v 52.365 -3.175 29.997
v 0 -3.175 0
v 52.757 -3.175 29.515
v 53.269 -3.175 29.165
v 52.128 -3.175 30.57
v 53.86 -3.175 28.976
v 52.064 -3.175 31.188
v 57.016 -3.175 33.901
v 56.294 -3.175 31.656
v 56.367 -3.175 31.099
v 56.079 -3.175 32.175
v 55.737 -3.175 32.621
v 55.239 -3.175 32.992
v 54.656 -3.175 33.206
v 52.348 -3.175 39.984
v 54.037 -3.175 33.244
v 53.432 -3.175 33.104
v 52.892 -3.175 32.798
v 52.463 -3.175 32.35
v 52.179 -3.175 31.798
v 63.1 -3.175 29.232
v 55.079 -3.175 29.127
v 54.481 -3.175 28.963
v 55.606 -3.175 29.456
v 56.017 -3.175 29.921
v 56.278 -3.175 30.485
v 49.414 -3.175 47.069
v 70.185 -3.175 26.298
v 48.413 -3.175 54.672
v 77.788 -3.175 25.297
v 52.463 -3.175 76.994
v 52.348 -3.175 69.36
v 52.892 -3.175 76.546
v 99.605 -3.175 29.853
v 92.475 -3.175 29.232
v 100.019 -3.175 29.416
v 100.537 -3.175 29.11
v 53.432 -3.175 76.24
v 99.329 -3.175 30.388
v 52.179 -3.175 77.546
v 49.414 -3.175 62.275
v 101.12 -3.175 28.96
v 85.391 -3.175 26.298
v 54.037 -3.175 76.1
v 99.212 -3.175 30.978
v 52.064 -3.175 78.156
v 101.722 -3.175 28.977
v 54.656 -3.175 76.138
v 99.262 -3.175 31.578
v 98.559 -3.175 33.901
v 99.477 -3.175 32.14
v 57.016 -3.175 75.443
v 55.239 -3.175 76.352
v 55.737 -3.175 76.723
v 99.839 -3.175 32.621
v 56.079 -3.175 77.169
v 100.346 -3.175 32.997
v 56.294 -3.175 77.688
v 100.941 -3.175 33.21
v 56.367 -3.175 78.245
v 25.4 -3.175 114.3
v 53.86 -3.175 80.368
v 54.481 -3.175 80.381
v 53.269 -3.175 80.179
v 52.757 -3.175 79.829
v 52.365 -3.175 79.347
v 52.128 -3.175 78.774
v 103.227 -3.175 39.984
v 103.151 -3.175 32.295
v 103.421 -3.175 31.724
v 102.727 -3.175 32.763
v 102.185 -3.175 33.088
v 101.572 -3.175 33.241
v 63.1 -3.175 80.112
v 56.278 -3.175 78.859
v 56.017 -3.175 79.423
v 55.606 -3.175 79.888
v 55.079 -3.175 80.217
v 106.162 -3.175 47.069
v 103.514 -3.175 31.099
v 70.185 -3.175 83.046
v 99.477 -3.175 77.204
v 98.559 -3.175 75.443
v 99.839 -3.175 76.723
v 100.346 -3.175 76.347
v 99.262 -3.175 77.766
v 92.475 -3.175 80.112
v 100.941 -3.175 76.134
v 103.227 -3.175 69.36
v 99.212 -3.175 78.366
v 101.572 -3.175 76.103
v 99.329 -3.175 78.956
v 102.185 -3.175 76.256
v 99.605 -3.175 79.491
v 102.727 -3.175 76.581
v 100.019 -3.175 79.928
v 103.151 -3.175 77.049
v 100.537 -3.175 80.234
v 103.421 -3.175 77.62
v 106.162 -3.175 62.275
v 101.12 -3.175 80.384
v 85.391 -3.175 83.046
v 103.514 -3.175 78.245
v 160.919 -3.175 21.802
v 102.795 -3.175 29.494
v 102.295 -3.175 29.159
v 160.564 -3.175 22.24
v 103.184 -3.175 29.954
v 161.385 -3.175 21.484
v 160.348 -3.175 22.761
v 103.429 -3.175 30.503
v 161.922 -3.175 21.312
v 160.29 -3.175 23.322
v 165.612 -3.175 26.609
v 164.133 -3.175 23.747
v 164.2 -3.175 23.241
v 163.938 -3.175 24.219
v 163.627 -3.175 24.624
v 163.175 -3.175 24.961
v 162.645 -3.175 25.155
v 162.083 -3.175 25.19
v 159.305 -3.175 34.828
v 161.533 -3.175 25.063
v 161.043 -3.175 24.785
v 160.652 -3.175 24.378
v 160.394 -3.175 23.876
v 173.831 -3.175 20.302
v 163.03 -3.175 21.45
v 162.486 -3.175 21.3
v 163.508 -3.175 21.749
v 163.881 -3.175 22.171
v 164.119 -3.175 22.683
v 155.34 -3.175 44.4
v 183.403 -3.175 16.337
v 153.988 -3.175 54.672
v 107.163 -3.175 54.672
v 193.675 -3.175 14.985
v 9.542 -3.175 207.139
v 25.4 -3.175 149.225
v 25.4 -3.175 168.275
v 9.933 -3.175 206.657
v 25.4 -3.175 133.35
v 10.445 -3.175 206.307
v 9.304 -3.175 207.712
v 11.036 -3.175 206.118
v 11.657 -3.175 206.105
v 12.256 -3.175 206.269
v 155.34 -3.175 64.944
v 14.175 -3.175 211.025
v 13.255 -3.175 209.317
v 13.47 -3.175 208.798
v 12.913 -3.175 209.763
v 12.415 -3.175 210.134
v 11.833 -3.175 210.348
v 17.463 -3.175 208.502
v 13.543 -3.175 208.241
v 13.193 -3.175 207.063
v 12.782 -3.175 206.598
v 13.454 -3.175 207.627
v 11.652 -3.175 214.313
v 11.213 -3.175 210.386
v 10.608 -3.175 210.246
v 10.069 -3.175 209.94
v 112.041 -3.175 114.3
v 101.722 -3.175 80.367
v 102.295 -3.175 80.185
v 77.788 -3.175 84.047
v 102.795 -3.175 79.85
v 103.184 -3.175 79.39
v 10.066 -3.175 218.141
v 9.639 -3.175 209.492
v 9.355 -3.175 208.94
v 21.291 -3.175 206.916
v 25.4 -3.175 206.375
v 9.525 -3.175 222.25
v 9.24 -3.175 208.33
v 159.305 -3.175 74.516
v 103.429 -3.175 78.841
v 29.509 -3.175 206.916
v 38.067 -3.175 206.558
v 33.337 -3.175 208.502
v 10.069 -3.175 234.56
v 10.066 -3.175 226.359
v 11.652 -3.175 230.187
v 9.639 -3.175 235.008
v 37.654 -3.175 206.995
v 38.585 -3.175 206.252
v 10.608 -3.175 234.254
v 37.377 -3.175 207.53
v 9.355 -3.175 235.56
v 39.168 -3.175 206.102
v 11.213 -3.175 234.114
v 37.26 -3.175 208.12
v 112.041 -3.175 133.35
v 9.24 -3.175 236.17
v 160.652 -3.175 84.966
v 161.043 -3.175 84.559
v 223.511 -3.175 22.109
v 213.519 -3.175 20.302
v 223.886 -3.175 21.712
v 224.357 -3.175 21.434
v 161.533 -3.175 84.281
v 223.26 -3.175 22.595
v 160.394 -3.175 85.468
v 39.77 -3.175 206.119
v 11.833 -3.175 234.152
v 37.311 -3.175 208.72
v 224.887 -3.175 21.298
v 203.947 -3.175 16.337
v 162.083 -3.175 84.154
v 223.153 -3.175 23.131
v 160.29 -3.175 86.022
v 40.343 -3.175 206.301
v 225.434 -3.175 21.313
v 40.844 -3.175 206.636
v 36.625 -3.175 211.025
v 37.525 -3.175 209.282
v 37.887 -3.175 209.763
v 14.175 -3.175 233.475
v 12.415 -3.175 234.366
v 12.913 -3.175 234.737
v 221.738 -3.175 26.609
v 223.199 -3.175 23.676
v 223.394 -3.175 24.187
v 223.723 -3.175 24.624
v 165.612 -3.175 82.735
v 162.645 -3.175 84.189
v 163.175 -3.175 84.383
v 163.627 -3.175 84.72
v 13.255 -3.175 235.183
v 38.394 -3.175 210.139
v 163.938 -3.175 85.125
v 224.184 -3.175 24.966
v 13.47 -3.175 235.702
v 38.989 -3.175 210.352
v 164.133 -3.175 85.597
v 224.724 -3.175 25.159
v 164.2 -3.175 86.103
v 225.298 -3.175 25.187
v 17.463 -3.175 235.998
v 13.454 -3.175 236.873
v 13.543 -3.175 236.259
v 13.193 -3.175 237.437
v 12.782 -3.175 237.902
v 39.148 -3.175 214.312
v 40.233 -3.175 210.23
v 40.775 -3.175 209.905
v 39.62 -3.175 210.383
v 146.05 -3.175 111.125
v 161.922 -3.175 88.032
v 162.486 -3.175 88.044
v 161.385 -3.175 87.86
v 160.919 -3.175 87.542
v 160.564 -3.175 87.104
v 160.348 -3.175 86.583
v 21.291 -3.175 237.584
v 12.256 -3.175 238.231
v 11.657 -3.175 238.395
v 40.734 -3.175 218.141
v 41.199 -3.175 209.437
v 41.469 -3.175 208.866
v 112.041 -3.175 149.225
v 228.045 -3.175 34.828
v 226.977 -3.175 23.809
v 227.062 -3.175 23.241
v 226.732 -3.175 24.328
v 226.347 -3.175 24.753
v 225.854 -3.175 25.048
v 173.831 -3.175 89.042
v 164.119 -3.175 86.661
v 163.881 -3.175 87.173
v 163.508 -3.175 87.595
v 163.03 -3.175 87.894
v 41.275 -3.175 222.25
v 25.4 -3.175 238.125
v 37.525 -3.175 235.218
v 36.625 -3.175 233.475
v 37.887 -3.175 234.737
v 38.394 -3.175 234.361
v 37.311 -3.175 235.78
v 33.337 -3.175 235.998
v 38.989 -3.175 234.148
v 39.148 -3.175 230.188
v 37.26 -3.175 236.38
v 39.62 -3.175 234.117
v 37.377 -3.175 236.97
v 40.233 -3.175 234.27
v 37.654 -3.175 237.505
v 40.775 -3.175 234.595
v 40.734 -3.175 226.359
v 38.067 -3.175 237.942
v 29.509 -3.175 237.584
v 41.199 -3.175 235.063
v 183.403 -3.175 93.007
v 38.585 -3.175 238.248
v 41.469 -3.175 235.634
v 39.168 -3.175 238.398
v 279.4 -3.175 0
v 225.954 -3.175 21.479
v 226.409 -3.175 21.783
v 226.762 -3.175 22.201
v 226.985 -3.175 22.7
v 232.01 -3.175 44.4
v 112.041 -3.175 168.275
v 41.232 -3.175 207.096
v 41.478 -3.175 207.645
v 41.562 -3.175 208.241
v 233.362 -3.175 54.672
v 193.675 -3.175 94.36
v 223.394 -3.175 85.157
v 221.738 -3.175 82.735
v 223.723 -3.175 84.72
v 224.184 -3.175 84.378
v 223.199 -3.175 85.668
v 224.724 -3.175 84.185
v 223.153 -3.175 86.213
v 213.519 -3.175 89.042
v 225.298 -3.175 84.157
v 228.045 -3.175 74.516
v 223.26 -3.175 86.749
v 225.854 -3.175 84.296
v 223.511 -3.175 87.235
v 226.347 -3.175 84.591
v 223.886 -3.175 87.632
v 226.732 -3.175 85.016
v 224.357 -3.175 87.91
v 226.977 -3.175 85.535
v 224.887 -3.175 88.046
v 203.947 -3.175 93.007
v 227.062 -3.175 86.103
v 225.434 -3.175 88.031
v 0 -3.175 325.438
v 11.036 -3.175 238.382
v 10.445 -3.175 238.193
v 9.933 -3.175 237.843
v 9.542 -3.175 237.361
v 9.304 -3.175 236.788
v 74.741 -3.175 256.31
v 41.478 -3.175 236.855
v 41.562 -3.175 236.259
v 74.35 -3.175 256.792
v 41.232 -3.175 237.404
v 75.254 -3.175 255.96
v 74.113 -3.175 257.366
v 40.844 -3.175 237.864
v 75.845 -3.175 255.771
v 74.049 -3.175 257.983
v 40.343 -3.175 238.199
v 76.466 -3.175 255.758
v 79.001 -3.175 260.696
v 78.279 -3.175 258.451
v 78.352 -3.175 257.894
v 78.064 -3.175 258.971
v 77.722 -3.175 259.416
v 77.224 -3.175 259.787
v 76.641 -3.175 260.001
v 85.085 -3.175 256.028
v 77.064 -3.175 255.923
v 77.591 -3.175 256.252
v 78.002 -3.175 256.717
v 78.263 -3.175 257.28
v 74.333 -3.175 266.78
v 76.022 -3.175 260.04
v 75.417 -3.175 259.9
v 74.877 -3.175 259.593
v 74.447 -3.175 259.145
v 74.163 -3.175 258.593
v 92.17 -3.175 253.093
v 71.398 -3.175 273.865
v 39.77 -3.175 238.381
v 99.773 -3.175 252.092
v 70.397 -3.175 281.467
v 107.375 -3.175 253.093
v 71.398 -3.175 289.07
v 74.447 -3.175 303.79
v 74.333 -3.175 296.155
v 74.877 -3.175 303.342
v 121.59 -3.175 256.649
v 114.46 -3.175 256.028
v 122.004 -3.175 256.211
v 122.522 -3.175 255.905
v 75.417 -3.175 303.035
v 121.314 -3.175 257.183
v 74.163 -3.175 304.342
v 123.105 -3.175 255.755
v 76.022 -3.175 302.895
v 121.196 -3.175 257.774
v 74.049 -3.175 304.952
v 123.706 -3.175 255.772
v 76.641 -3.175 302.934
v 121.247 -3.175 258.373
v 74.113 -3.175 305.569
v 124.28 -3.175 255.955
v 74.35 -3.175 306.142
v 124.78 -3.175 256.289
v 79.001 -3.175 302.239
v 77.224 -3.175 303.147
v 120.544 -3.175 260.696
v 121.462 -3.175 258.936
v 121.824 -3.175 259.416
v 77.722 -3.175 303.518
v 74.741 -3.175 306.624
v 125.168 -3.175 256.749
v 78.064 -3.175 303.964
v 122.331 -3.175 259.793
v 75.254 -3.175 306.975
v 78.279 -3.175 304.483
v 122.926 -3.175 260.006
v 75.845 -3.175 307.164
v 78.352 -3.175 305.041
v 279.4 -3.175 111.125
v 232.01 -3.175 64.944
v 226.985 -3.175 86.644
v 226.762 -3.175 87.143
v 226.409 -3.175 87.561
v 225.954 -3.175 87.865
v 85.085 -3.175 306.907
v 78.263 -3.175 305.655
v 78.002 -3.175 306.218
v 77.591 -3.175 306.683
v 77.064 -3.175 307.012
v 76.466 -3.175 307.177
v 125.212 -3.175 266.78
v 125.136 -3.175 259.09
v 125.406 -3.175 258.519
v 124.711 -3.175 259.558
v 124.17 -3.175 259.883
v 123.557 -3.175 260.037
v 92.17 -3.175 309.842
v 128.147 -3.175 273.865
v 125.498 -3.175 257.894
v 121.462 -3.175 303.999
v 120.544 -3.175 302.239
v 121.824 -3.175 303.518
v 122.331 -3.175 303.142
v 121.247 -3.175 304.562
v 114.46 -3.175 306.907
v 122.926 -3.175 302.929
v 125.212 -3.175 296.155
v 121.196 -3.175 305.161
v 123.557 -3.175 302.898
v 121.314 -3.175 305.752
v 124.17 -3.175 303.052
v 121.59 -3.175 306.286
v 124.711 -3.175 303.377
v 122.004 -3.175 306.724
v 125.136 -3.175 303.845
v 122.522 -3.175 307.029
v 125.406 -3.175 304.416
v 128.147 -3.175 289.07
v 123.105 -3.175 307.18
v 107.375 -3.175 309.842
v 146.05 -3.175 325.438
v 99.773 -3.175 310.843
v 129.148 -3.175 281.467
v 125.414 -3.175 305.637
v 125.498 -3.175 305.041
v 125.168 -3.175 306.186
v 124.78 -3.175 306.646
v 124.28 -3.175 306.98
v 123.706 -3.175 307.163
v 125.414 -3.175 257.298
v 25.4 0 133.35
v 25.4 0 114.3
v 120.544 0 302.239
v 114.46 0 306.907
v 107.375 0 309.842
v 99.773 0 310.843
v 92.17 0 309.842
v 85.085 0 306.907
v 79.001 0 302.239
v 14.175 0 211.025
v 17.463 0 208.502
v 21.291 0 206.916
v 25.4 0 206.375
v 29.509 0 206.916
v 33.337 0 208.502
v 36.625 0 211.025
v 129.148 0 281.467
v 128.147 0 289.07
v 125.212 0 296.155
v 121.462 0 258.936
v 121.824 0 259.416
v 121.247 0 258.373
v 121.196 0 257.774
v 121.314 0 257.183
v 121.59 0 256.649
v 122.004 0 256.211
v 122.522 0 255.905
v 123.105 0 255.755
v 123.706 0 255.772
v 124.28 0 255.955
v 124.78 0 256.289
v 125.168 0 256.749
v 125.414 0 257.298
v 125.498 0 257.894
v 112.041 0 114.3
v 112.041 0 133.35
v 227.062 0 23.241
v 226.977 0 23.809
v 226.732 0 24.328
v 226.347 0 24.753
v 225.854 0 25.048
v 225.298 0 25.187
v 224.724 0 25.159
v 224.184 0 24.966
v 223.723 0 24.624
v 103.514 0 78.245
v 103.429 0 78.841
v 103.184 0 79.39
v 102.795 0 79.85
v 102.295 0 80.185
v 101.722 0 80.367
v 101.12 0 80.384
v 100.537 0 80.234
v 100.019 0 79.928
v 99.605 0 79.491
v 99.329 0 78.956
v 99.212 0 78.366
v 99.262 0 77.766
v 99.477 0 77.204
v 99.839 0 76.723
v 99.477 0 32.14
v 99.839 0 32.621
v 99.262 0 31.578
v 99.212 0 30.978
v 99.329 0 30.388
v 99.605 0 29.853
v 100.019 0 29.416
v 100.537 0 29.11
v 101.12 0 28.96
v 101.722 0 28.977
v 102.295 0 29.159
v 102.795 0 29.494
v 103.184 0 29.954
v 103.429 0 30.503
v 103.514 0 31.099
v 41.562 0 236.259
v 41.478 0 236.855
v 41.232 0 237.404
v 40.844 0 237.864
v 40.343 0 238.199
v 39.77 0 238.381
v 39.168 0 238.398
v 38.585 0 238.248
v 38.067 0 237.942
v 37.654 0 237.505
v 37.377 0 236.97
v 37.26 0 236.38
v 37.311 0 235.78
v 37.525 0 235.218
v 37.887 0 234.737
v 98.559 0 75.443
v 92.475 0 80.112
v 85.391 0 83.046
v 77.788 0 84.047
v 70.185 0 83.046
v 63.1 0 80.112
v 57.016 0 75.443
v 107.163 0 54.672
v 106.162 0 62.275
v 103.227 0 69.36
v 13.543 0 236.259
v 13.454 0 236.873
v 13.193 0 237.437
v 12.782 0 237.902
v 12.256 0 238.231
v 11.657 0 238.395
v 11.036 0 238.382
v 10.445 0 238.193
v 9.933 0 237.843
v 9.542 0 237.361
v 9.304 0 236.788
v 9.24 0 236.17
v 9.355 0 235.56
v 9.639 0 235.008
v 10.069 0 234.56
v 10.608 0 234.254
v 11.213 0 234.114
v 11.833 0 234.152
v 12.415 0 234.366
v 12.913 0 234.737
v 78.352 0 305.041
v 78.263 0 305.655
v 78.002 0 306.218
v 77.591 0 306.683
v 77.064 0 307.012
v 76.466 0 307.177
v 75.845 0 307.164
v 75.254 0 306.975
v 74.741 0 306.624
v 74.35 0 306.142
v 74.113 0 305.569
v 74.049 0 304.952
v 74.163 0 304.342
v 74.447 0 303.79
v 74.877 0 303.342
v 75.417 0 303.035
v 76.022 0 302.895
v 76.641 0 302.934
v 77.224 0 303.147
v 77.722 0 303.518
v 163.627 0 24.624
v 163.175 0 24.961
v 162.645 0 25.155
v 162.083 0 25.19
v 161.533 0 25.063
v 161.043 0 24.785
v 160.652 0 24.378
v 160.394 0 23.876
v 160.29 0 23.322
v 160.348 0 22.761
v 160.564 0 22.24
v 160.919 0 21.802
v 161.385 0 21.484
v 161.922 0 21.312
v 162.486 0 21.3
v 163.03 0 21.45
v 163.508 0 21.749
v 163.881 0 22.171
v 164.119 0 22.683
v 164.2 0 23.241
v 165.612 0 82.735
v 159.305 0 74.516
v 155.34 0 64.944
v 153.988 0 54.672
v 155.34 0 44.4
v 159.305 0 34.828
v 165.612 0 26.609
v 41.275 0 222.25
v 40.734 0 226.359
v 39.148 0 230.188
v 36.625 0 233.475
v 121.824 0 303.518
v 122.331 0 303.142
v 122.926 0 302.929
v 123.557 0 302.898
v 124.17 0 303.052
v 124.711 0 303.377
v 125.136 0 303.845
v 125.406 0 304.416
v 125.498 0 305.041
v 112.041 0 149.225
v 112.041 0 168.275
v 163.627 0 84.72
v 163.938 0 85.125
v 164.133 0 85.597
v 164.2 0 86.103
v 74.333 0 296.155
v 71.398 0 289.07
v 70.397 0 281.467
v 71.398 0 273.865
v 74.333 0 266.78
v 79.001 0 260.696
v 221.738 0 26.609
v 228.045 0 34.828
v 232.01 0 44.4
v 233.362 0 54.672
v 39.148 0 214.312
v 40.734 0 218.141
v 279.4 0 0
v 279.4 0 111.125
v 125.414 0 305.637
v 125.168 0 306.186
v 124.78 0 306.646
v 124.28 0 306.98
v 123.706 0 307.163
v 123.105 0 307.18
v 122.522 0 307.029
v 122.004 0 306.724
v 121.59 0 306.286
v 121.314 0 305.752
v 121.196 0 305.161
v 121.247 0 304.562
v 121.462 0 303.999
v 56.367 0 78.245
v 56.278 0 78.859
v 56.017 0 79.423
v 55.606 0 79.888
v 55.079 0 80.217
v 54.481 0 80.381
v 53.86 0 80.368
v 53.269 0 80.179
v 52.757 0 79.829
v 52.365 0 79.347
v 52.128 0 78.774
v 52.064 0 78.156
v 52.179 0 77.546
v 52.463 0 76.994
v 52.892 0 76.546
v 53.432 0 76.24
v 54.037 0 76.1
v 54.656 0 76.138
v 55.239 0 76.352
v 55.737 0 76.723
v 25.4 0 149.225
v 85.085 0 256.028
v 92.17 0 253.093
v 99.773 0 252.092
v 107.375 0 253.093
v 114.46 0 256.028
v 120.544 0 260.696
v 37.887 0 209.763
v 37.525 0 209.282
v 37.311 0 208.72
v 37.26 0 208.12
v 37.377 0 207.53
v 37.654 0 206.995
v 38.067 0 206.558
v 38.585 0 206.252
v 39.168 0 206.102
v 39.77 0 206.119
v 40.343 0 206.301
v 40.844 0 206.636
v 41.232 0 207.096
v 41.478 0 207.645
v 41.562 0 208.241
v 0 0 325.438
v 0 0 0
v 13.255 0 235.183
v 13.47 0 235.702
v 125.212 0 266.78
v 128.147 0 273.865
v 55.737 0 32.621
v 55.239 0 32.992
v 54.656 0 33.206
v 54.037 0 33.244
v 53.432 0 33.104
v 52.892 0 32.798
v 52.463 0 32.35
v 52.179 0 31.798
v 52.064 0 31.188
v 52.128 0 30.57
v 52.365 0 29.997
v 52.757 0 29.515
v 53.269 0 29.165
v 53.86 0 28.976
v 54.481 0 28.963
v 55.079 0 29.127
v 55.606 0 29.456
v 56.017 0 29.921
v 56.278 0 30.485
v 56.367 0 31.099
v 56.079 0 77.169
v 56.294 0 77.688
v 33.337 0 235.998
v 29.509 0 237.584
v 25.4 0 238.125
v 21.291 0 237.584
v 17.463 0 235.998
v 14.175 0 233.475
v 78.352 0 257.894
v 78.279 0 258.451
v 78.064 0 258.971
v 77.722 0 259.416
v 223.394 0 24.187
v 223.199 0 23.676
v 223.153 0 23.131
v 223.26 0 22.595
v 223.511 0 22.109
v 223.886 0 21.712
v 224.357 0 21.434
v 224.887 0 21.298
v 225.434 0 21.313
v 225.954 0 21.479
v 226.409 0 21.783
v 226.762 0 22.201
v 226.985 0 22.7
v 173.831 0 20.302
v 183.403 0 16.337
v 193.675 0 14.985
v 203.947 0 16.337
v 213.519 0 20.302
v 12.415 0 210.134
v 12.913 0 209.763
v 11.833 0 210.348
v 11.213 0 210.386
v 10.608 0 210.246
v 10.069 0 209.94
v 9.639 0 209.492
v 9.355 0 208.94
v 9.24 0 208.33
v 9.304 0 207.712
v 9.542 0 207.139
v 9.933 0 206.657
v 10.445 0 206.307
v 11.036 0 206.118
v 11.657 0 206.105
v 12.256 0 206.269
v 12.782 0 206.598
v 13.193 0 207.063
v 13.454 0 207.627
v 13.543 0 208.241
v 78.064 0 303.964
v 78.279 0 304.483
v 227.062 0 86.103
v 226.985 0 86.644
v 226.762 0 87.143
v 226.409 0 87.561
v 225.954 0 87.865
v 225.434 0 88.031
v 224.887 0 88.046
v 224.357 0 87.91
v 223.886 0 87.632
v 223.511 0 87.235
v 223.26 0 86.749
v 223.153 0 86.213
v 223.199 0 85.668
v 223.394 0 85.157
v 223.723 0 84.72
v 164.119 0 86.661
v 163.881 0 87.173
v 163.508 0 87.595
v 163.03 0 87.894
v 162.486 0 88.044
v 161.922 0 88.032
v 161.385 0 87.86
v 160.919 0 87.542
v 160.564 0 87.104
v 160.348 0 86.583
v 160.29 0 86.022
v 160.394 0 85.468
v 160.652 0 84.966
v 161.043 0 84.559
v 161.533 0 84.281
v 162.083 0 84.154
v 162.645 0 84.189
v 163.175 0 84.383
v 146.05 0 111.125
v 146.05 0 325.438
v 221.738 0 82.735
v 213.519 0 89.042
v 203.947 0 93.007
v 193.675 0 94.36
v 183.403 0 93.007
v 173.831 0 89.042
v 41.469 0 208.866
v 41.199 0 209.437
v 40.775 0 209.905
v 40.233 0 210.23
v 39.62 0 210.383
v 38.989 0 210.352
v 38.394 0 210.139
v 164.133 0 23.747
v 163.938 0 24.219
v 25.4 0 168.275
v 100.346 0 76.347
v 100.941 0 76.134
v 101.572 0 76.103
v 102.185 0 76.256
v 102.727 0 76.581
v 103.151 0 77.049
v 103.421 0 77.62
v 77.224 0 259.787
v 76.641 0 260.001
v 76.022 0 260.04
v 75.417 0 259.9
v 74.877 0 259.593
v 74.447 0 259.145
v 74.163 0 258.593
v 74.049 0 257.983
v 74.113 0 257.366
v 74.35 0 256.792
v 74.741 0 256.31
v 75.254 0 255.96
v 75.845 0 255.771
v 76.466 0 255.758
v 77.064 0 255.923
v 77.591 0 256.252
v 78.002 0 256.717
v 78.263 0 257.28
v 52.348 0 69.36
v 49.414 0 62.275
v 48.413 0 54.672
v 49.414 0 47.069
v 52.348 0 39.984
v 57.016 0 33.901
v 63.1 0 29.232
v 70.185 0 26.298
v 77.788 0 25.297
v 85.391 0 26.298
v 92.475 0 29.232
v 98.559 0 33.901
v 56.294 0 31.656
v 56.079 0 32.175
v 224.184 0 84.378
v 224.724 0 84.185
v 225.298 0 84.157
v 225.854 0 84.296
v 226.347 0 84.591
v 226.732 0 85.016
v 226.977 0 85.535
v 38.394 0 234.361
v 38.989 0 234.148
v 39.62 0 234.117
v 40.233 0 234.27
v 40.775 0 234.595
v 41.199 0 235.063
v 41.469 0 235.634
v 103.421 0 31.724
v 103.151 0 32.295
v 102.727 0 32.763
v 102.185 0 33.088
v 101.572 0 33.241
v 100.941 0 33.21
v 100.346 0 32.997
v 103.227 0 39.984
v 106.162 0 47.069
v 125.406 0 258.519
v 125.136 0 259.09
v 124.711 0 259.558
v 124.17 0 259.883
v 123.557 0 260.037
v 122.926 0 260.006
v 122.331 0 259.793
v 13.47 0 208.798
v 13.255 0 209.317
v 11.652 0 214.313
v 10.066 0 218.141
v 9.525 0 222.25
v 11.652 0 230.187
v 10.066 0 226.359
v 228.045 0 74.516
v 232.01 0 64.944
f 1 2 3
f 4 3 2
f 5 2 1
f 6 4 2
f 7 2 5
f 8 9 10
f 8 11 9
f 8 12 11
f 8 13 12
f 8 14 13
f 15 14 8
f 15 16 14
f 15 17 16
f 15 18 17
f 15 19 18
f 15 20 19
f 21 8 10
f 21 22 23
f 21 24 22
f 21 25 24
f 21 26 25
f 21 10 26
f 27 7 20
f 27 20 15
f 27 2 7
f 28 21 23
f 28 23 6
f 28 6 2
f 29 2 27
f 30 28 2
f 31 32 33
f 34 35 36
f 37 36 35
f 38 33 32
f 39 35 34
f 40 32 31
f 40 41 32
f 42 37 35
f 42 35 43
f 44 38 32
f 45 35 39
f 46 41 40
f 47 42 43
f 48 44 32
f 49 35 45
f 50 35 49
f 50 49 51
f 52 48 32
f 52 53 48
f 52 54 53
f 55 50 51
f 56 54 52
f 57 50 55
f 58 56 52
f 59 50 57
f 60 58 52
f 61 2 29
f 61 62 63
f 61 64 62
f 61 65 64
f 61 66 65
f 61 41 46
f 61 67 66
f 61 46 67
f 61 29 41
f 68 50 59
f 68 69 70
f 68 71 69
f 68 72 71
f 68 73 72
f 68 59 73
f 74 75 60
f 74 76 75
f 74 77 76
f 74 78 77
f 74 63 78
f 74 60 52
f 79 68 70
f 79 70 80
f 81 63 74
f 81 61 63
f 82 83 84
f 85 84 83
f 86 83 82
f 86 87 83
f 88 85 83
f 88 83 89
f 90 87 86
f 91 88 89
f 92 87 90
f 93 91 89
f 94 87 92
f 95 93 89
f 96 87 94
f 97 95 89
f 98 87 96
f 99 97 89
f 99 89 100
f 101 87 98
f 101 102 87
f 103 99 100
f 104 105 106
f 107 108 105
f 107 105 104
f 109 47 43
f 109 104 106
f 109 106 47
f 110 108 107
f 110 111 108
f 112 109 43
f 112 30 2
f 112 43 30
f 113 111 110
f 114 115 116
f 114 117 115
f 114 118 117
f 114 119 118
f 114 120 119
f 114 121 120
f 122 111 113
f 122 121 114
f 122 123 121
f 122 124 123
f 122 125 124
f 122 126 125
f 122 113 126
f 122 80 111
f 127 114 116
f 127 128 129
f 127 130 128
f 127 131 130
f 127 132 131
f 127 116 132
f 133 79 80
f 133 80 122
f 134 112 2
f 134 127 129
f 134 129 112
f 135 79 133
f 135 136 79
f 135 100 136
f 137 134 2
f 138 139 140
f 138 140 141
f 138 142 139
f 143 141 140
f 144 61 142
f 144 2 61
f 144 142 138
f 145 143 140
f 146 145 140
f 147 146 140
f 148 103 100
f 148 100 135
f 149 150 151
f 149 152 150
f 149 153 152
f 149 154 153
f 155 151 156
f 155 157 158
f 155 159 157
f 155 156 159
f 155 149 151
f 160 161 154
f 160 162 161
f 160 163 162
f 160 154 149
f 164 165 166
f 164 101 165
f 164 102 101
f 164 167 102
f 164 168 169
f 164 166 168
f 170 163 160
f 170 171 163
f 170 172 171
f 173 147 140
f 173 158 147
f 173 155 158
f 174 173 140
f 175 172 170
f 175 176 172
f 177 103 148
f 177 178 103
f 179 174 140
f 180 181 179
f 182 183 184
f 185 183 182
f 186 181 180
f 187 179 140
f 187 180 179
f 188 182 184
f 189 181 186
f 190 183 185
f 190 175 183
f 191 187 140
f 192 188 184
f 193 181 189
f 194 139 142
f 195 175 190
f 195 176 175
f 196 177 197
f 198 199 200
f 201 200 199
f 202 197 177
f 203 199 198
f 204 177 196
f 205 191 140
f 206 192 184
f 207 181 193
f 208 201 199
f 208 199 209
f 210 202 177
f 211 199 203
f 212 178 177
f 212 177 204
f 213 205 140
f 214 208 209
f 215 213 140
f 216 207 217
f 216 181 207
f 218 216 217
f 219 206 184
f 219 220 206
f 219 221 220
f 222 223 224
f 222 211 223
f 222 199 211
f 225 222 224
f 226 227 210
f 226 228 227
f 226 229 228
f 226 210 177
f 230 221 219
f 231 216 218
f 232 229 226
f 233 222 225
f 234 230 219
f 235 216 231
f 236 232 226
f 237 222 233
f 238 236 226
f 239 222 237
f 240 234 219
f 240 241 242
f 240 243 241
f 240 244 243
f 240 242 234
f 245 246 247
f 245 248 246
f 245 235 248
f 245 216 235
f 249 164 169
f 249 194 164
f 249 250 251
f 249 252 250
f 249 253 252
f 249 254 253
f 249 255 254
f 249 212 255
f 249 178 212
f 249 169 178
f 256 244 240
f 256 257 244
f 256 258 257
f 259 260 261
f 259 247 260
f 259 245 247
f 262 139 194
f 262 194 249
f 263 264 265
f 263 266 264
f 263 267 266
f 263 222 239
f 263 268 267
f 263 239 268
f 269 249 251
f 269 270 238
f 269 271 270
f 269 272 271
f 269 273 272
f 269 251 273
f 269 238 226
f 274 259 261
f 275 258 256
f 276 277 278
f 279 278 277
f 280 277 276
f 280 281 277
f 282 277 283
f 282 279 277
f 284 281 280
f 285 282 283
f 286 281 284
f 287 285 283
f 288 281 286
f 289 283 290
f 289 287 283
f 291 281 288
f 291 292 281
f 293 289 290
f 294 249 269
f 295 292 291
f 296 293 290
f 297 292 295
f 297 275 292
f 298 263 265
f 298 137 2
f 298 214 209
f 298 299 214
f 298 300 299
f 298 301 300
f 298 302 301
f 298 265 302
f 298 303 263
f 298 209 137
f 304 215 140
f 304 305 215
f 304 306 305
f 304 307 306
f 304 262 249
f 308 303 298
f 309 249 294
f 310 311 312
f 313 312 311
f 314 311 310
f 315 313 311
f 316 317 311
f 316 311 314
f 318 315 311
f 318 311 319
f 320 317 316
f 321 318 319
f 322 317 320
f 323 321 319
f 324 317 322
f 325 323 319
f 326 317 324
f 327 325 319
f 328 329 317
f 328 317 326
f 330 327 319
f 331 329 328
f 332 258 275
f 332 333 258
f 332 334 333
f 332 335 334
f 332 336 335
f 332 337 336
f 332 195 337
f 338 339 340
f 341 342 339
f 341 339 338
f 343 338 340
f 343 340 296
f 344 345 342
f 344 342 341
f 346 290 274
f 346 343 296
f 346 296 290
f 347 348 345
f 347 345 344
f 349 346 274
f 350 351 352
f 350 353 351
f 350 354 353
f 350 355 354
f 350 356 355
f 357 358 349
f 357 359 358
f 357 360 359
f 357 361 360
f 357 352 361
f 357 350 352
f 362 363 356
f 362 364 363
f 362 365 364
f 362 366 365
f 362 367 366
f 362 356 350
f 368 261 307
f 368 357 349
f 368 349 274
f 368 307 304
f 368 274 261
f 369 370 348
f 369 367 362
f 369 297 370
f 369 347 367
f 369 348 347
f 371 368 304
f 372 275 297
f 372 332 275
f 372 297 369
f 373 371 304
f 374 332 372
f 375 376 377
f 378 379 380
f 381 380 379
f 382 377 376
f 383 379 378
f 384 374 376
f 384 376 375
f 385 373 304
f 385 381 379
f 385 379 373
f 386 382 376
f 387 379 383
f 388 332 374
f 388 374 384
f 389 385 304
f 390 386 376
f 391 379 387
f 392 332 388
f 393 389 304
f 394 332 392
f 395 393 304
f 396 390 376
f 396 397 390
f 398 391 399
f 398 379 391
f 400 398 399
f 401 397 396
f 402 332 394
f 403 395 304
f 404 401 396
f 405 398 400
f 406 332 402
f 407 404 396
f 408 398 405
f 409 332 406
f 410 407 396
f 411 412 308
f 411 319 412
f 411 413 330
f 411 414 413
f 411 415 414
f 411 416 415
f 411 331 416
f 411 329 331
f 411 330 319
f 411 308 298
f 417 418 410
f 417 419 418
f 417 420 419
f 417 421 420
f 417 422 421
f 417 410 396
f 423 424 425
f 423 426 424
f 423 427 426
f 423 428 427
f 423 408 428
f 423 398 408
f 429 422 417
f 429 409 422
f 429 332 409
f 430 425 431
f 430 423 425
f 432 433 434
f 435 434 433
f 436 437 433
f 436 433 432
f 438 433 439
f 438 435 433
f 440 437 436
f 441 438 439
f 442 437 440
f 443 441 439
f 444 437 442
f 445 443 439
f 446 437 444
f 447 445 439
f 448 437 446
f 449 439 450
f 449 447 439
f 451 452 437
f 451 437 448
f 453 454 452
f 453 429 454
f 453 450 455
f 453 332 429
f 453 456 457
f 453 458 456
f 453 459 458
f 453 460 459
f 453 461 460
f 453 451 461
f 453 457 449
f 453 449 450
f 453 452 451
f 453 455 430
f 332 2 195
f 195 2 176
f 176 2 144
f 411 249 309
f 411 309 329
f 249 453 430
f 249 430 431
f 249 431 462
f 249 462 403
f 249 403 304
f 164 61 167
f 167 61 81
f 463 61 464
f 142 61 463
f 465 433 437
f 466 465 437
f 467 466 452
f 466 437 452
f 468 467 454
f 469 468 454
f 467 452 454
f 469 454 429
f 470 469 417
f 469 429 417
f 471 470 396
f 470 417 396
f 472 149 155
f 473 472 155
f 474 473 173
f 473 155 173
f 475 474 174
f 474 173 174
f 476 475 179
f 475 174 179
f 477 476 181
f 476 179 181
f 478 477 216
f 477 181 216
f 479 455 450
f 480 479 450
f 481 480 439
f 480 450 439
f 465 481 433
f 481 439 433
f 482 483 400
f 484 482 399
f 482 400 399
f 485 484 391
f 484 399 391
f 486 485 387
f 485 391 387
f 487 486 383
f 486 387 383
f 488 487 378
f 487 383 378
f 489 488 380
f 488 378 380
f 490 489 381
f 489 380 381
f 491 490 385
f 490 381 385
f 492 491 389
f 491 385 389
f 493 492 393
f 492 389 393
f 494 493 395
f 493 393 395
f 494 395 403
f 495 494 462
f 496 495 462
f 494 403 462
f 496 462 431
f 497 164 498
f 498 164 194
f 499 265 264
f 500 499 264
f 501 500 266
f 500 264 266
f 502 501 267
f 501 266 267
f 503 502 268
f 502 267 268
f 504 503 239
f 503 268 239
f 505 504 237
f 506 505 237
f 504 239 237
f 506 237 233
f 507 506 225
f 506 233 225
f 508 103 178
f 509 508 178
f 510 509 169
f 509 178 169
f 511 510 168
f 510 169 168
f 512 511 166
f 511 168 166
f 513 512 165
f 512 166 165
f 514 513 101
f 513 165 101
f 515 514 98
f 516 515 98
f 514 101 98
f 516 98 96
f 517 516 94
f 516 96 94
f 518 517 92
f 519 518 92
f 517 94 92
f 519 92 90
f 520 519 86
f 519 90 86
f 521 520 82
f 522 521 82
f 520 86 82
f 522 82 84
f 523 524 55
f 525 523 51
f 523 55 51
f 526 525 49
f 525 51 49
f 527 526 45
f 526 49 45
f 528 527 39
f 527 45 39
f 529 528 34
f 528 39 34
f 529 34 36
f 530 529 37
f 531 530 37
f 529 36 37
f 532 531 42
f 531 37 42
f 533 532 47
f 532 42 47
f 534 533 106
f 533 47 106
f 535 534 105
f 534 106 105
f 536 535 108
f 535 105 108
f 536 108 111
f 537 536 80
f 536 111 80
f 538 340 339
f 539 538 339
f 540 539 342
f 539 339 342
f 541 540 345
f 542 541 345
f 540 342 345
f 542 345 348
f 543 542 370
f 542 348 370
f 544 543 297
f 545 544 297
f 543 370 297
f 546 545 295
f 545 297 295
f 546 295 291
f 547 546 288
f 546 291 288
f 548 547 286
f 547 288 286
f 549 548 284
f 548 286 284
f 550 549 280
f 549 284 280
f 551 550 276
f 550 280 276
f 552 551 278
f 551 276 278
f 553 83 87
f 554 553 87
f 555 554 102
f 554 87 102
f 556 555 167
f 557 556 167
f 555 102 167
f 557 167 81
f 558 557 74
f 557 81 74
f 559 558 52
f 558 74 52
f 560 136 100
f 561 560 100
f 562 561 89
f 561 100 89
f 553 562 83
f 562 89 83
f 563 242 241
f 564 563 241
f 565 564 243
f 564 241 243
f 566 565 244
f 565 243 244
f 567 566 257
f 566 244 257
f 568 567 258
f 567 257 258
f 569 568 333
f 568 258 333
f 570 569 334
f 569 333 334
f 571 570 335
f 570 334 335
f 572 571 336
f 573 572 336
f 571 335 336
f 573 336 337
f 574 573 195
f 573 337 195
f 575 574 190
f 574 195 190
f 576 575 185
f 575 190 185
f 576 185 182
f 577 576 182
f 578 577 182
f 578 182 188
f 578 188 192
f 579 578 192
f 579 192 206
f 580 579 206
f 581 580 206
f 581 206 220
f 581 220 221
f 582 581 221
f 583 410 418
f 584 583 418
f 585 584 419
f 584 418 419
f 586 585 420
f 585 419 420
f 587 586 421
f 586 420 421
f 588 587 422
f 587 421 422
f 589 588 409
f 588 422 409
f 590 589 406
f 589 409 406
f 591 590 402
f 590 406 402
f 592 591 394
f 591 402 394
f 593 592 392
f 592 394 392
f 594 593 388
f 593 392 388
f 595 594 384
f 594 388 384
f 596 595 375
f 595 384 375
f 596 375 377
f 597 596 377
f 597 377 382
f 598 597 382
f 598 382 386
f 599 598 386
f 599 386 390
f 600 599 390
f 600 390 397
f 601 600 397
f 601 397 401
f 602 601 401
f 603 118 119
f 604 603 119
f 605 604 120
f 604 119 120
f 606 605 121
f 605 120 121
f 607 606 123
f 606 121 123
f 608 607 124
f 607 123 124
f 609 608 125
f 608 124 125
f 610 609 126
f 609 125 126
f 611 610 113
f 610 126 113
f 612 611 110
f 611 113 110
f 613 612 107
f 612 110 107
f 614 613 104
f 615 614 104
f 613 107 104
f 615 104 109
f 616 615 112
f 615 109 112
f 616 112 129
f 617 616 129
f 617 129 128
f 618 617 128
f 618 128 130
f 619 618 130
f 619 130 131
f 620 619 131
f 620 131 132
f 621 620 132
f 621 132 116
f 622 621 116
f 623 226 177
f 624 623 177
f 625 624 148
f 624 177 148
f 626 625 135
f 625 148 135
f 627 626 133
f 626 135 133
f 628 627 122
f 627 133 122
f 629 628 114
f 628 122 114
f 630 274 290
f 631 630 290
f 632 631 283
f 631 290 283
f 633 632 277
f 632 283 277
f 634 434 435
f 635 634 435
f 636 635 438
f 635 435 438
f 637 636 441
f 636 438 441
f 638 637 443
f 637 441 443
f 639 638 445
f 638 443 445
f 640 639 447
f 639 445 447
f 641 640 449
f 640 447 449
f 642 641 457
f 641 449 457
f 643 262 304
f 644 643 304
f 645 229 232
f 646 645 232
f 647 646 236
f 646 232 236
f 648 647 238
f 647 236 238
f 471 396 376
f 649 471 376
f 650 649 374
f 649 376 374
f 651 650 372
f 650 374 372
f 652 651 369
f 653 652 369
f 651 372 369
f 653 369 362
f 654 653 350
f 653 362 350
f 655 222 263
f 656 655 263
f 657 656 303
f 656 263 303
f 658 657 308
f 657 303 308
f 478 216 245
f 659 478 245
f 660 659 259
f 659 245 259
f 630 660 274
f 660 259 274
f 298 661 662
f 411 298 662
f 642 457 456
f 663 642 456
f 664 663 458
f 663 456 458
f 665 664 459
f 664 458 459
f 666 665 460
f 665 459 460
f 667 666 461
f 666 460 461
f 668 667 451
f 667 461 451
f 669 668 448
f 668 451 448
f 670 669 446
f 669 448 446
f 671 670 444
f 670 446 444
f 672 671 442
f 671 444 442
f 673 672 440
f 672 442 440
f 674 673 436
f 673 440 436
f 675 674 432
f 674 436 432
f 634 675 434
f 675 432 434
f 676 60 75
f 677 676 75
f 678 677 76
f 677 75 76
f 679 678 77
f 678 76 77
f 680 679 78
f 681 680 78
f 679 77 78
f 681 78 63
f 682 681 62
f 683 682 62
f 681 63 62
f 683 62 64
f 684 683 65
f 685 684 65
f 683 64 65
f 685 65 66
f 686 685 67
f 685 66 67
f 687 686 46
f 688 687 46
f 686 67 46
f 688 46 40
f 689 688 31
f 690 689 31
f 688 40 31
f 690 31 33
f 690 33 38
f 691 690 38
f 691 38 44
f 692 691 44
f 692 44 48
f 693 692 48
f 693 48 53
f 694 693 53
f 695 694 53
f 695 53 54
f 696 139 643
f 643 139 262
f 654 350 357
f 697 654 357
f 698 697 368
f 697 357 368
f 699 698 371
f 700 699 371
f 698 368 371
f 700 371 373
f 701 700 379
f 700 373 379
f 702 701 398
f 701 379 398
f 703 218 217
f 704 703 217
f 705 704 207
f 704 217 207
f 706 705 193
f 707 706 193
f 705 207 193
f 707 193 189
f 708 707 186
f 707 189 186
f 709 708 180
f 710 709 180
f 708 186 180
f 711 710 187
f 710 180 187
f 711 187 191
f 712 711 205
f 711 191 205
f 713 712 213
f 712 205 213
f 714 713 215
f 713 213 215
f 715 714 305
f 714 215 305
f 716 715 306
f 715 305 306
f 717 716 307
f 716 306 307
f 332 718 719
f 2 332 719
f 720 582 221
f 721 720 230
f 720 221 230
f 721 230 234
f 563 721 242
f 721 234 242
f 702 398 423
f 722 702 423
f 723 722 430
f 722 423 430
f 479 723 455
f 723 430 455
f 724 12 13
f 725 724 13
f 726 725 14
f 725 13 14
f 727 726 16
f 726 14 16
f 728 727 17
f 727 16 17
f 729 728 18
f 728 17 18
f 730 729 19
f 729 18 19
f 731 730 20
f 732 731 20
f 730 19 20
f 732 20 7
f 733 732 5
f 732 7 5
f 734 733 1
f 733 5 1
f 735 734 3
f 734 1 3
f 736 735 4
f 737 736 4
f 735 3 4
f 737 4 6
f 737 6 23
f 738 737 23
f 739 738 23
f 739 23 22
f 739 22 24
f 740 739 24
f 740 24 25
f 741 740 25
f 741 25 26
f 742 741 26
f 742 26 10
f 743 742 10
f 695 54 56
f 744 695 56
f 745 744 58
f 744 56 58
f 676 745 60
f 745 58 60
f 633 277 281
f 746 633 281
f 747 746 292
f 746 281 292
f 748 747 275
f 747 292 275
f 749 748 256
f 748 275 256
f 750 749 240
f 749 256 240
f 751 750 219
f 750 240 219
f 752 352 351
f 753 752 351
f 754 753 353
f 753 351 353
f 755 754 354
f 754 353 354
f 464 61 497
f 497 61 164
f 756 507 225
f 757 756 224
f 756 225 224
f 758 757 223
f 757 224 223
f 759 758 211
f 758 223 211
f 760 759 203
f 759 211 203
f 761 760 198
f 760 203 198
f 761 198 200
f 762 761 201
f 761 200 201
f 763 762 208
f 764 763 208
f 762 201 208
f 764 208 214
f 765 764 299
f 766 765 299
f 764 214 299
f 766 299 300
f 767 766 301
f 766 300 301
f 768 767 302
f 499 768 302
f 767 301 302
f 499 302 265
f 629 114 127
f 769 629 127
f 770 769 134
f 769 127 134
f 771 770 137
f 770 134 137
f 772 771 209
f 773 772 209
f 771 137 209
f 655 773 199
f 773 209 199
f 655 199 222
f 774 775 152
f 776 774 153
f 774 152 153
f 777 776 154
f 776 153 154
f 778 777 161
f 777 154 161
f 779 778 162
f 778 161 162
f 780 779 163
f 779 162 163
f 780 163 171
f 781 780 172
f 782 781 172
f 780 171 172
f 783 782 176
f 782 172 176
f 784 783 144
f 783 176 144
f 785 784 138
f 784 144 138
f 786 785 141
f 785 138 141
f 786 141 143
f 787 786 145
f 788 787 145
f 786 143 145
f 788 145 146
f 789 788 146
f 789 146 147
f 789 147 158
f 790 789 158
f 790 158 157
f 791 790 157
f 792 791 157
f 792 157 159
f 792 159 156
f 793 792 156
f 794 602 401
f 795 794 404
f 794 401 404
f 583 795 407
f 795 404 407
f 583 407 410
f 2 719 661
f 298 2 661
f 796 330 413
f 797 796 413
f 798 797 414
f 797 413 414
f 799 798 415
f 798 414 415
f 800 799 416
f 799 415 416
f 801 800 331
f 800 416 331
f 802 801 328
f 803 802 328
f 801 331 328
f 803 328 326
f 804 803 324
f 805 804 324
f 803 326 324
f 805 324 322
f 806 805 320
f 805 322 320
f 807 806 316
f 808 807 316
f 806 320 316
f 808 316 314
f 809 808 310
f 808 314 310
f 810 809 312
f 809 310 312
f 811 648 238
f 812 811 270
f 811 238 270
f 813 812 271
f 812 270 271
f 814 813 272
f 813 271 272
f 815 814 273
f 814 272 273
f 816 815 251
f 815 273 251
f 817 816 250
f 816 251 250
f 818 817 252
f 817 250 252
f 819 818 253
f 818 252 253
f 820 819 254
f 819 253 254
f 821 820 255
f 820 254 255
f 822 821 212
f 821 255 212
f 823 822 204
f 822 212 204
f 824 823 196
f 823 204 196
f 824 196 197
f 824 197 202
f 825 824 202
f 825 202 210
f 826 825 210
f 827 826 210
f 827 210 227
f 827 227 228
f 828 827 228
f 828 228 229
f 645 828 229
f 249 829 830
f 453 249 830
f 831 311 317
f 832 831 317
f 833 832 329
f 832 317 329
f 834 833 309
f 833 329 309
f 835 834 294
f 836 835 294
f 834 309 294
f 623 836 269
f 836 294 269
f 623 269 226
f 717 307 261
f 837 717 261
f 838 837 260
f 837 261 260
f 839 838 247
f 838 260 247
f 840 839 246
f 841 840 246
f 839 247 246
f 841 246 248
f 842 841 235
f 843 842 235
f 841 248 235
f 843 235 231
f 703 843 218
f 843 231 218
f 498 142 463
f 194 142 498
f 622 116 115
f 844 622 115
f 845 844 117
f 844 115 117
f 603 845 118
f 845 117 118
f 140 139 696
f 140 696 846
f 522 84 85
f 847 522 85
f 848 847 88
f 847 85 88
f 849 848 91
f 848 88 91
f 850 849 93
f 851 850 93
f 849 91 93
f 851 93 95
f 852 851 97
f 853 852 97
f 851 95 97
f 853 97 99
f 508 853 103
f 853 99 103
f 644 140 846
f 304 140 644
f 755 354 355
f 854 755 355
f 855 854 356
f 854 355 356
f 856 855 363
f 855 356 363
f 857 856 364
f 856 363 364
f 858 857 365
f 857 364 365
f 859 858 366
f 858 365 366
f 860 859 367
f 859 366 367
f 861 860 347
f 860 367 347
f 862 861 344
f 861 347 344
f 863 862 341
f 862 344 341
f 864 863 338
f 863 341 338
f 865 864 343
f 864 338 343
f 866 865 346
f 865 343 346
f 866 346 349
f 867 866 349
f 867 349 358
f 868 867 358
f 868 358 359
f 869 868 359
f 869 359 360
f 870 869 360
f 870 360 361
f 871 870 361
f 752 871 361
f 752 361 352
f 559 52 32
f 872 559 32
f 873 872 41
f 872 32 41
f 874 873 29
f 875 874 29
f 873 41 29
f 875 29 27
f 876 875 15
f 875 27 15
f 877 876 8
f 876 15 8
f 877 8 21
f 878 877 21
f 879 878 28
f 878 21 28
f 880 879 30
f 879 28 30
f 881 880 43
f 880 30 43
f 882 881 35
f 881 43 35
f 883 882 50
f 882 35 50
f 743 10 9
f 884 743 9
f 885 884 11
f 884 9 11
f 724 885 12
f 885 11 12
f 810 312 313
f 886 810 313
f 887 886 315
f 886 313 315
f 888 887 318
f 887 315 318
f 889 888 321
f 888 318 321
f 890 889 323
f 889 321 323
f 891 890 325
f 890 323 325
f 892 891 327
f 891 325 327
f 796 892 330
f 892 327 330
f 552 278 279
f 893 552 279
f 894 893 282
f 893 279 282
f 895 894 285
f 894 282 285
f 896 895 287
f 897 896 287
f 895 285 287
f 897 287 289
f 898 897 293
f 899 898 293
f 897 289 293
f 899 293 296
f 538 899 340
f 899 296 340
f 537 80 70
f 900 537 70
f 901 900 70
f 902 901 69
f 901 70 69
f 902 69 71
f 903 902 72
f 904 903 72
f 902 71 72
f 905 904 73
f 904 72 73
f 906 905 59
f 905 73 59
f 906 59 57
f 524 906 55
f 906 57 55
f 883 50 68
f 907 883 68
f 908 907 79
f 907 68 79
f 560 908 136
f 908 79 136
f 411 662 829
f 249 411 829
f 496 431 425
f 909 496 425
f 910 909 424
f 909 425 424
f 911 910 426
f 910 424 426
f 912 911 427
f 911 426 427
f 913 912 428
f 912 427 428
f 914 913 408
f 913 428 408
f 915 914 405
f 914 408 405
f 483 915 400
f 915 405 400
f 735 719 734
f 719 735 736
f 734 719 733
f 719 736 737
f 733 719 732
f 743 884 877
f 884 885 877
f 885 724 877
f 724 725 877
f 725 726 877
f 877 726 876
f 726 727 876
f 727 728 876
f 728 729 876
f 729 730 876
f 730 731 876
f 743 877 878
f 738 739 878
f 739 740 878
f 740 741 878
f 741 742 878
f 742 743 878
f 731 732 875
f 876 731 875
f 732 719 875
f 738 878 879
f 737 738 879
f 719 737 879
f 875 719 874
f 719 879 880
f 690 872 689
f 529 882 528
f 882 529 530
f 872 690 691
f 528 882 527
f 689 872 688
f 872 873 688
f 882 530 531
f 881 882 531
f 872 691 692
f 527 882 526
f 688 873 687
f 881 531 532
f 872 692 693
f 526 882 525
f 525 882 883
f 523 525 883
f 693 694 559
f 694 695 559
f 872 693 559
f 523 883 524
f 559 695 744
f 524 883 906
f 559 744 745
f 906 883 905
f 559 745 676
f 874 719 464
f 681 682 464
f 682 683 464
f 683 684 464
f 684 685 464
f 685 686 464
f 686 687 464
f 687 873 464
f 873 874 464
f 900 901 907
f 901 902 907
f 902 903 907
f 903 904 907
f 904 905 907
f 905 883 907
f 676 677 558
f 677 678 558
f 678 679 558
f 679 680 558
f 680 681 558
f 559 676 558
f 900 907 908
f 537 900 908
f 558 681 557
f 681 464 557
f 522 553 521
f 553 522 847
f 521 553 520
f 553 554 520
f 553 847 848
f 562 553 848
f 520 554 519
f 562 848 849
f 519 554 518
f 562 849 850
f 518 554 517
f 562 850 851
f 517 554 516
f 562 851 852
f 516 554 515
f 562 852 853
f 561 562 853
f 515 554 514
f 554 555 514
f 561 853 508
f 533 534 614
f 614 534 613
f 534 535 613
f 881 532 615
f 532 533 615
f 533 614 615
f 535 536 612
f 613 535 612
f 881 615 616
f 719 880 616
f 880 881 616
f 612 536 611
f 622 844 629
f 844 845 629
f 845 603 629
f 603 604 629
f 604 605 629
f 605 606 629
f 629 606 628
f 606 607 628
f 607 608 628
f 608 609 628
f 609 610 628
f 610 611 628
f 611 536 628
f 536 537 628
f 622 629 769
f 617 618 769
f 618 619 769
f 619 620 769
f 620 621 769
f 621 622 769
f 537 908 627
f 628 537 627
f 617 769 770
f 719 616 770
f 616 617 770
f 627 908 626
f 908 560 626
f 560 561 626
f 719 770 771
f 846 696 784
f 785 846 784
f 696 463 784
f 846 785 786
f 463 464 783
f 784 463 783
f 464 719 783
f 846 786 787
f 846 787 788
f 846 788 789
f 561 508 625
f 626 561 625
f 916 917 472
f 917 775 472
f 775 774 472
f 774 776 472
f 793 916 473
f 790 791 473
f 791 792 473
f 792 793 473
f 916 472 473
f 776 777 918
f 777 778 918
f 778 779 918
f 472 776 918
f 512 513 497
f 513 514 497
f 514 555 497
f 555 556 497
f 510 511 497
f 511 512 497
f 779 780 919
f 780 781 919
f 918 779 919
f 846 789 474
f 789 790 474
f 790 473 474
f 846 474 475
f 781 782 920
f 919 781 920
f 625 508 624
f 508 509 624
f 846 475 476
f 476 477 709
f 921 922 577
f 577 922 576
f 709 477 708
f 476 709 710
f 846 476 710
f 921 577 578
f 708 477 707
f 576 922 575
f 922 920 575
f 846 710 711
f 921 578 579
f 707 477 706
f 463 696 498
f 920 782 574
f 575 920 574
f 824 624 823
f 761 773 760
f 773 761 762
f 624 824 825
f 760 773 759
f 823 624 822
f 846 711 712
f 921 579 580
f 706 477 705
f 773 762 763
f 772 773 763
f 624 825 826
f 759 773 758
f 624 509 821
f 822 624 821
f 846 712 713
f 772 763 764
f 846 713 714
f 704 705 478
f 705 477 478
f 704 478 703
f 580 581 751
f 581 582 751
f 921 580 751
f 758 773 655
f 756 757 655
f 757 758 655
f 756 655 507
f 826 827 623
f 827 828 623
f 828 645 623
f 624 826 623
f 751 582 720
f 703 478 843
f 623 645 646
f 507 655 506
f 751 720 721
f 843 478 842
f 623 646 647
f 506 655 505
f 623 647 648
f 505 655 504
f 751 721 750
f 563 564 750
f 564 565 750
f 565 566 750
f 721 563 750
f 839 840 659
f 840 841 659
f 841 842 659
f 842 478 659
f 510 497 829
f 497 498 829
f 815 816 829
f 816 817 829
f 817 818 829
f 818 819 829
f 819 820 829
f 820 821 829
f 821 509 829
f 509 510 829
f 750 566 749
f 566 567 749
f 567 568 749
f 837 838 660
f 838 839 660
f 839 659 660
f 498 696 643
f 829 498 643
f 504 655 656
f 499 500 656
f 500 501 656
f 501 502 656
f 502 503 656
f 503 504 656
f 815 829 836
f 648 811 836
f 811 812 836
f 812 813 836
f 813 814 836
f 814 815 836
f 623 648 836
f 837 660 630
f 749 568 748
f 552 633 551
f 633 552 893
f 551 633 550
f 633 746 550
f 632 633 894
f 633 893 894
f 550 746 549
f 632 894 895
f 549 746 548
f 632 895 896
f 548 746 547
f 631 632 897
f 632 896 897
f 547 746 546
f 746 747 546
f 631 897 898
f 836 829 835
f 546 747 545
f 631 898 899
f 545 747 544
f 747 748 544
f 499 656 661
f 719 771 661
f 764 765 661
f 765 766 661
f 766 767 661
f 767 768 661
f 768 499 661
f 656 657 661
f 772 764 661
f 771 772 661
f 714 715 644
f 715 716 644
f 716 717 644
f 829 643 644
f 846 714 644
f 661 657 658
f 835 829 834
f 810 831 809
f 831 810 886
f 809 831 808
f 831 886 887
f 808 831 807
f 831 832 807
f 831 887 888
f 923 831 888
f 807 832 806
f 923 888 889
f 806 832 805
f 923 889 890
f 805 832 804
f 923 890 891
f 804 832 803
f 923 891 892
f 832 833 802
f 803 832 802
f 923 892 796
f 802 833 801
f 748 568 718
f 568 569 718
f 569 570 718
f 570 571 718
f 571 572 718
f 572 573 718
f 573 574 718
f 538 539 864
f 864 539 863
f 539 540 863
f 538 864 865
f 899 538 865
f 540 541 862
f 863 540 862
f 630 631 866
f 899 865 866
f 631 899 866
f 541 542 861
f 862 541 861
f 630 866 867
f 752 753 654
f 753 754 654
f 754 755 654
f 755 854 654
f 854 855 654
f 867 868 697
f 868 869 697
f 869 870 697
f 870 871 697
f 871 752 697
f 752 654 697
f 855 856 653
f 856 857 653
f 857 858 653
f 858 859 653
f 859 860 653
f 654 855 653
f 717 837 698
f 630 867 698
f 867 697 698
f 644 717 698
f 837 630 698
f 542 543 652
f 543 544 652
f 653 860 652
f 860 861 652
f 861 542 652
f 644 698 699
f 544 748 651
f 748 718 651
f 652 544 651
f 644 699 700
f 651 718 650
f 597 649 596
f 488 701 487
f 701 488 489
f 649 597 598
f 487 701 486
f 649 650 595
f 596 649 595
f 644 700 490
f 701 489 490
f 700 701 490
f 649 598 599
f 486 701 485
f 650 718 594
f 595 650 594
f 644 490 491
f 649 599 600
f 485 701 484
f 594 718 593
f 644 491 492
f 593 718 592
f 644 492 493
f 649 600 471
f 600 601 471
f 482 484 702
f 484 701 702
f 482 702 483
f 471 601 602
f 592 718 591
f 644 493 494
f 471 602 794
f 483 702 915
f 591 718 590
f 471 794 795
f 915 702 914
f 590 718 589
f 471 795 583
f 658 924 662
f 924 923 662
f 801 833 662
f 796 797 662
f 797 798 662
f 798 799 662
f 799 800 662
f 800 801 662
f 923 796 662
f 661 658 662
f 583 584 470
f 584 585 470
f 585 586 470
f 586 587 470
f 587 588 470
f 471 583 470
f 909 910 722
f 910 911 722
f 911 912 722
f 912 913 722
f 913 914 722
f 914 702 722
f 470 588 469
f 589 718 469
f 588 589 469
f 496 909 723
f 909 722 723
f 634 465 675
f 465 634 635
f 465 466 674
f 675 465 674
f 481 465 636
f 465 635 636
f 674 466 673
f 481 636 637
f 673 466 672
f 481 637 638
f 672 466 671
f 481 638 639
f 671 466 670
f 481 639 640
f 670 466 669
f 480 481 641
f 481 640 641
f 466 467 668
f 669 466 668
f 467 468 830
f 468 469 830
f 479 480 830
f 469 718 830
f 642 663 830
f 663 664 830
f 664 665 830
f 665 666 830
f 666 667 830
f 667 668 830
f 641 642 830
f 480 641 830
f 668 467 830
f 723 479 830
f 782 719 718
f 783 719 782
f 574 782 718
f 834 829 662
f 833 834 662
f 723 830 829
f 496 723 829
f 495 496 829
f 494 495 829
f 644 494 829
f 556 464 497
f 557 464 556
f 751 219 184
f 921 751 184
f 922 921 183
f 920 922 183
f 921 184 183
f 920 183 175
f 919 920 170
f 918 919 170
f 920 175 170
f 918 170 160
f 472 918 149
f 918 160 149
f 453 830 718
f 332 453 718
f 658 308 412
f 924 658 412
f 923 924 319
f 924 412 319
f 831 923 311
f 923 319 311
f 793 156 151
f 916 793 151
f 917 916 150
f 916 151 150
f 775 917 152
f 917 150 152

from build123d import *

# Parameters (mm, degrees)
F1_DEPTH = 3.175
F2_W     = 86.641395
F2_H     = 19.05
F3_DEPTH = 25.4


with BuildPart() as f1:
    # F0 (on Front) → F1 (new body)
    with BuildSketch(Plane.XZ):
        Polygon((146.05, 325.4375), (0, 325.4375), (0, 0), (279.4, 0), (279.4, 111.125), (146.05, 111.125), align=None)
    extrude(amount=F1_DEPTH)

    # F2 (on face) → F3 (cut)
    with BuildSketch(Plane.XZ.offset(3.175)):
        with BuildLine():
            ThreePointArc((221.7383, 26.608702), (230.341469, 39.484254), (233.3625, 54.672003))
            ThreePointArc((233.3625, 54.672003), (230.341469, 69.859752), (221.7383, 82.735303))
            Line((221.7383, 82.735303), (193.675, 54.672003))
            Line((193.675, 54.672003), (221.7383, 26.608702))
        make_face()
        with BuildLine():
            ThreePointArc((227.061696, 23.241106), (225.854349, 25.04803), (223.722937, 24.624066))
            ThreePointArc((223.722937, 24.624066), (224.357444, 21.434183), (227.061696, 23.241106))
        make_face()
        with BuildLine():
            ThreePointArc((164.199904, 23.241106), (164.051027, 23.989559), (163.627063, 24.624066))
            ThreePointArc((163.627063, 24.624066), (160.43718, 22.492654), (164.199904, 23.241106))
        make_face()
        with BuildLine():
            ThreePointArc((164.199904, 86.102899), (160.43718, 86.851352), (163.627063, 84.71994))
            ThreePointArc((163.627063, 84.71994), (164.051027, 85.354447), (164.199904, 86.102899))
        make_face()
        with BuildLine():
            ThreePointArc((227.061696, 86.102899), (224.357444, 87.909823), (223.722937, 84.71994))
            ThreePointArc((223.722937, 84.71994), (225.854349, 84.295976), (227.061696, 86.102899))
        make_face()
        with BuildLine():
            Line((193.675, 54.672003), (221.7383, 82.735303))
            ThreePointArc((221.7383, 82.735303), (193.675, 94.359503), (165.6117, 82.735303))
            Line((165.6117, 82.735303), (193.675, 54.672003))
        make_face()
        with BuildLine():
            ThreePointArc((165.6117, 26.608702), (193.675, 14.984503), (221.7383, 26.608702))
            Line((221.7383, 26.608702), (193.675, 54.672003))
            Line((193.675, 54.672003), (165.6117, 26.608702))
        make_face()
        with BuildLine():
            Line((193.675, 54.672003), (165.6117, 82.735303))
            ThreePointArc((165.6117, 82.735303), (153.9875, 54.672003), (165.6117, 26.608702))
            Line((165.6117, 26.608702), (193.675, 54.672003))
        make_face()
        with BuildLine():
            ThreePointArc((36.62532, 211.02468), (40.066588, 216.174901), (41.275, 222.25))
            ThreePointArc((41.275, 222.25), (40.066588, 228.325099), (36.62532, 233.47532))
            Line((36.62532, 233.47532), (25.4, 222.25))
            Line((25.4, 222.25), (36.62532, 211.02468))
        make_face()
        with BuildLine():
            ThreePointArc((41.56185, 208.2408), (40.232983, 210.22959), (37.887046, 209.762954))
            ThreePointArc((37.887046, 209.762954), (38.585416, 206.252011), (41.56185, 208.2408))
        make_face()
        with BuildLine():
            ThreePointArc((13.54345, 208.2408), (13.37959, 209.064584), (12.912954, 209.762954))
            ThreePointArc((12.912954, 209.762954), (9.402011, 207.417017), (13.54345, 208.2408))
        make_face()
        with BuildLine():
            ThreePointArc((13.54345, 236.2592), (9.402011, 237.082983), (12.912954, 234.737046))
            ThreePointArc((12.912954, 234.737046), (13.37959, 235.435416), (13.54345, 236.2592))
        make_face()
        with BuildLine():
            ThreePointArc((41.56185, 236.2592), (38.585416, 238.247989), (37.887046, 234.737046))
            ThreePointArc((37.887046, 234.737046), (40.232983, 234.27041), (41.56185, 236.2592))
        make_face()
        with BuildLine():
            Line((25.4, 222.25), (36.62532, 233.47532))
            ThreePointArc((36.62532, 233.47532), (25.4, 238.125), (14.17468, 233.47532))
            Line((14.17468, 233.47532), (25.4, 222.25))
        make_face()
        with BuildLine():
            ThreePointArc((14.17468, 211.02468), (25.4, 206.375), (36.62532, 211.02468))
            Line((36.62532, 211.02468), (25.4, 222.25))
            Line((25.4, 222.25), (14.17468, 211.02468))
        make_face()
        with BuildLine():
            Line((25.4, 222.25), (14.17468, 233.47532))
            ThreePointArc((14.17468, 233.47532), (9.525, 222.25), (14.17468, 211.02468))
            Line((14.17468, 211.02468), (25.4, 222.25))
        make_face()
        with BuildLine():
            ThreePointArc((120.54389, 260.696076), (126.911611, 270.226044), (129.147658, 281.467408))
            ThreePointArc((129.147658, 281.467408), (126.911611, 292.708772), (120.54389, 302.23874))
            Line((120.54389, 302.23874), (99.772558, 281.467408))
            Line((99.772558, 281.467408), (120.54389, 260.696076))
        make_face()
        with BuildLine():
            ThreePointArc((125.49838, 257.894236), (124.169513, 259.883025), (121.823577, 259.416389))
            ThreePointArc((121.823577, 259.416389), (122.521946, 255.905446), (125.49838, 257.894236))
        make_face()
        with BuildLine():
            ThreePointArc((78.352035, 257.894236), (78.188175, 258.718019), (77.721539, 259.416389))
            ThreePointArc((77.721539, 259.416389), (74.210596, 257.070452), (78.352035, 257.894236))
        make_face()
        with BuildLine():
            ThreePointArc((78.352035, 305.04058), (74.210596, 305.864364), (77.721539, 303.518427))
            ThreePointArc((77.721539, 303.518427), (78.188175, 304.216797), (78.352035, 305.04058))
        make_face()
        with BuildLine():
            ThreePointArc((125.49838, 305.04058), (122.521946, 307.02937), (121.823577, 303.518427))
            ThreePointArc((121.823577, 303.518427), (124.169513, 303.051791), (125.49838, 305.04058))
        make_face()
        with BuildLine():
            Line((99.772558, 281.467408), (120.54389, 302.23874))
            ThreePointArc((120.54389, 302.23874), (99.772558, 310.842508), (79.001225, 302.23874))
            Line((79.001225, 302.23874), (99.772558, 281.467408))
        make_face()
        with BuildLine():
            ThreePointArc((79.001225, 260.696076), (99.772558, 252.092308), (120.54389, 260.696076))
            Line((120.54389, 260.696076), (99.772558, 281.467408))
            Line((99.772558, 281.467408), (79.001225, 260.696076))
        make_face()
        with BuildLine():
            Line((99.772558, 281.467408), (79.001225, 302.23874))
            ThreePointArc((79.001225, 302.23874), (70.397458, 281.467408), (79.001225, 260.696076))
            Line((79.001225, 260.696076), (99.772558, 281.467408))
        make_face()
        with Locations((68.720697, 158.75)):
            Rectangle(F2_W, F2_H)
        with Locations((68.720697, 123.825)):
            Rectangle(F2_W, F2_H)
        with BuildLine():
            ThreePointArc((98.559112, 33.90067), (104.926833, 43.430639), (107.162879, 54.672003))
            ThreePointArc((107.162879, 54.672003), (104.926833, 65.913367), (98.559112, 75.443335))
            Line((98.559112, 75.443335), (77.787779, 54.672003))
            Line((77.787779, 54.672003), (98.559112, 33.90067))
        make_face()
        with BuildLine():
            ThreePointArc((103.513602, 31.098831), (102.184735, 33.08762), (99.838798, 32.620984))
            ThreePointArc((99.838798, 32.620984), (100.537168, 29.110041), (103.513602, 31.098831))
        make_face()
        with BuildLine():
            ThreePointArc((56.367257, 31.098831), (56.203396, 31.922614), (55.73676, 32.620984))
            ThreePointArc((55.73676, 32.620984), (52.225818, 30.275047), (56.367257, 31.098831))
        make_face()
        with BuildLine():
            ThreePointArc((56.367257, 78.245175), (52.225818, 79.068959), (55.73676, 76.723022))
            ThreePointArc((55.73676, 76.723022), (56.203396, 77.421392), (56.367257, 78.245175))
        make_face()
        with BuildLine():
            ThreePointArc((103.513602, 78.245175), (100.537168, 80.233964), (99.838798, 76.723022))
            ThreePointArc((99.838798, 76.723022), (102.184735, 76.256386), (103.513602, 78.245175))
        make_face()
        with BuildLine():
            Line((77.787779, 54.672003), (98.559112, 75.443335))
            ThreePointArc((98.559112, 75.443335), (77.787779, 84.047103), (57.016447, 75.443335))
            Line((57.016447, 75.443335), (77.787779, 54.672003))
        make_face()
        with BuildLine():
            ThreePointArc((57.016447, 33.90067), (77.787779, 25.296903), (98.559112, 33.90067))
            Line((98.559112, 33.90067), (77.787779, 54.672003))
            Line((77.787779, 54.672003), (57.016447, 33.90067))
        make_face()
        with BuildLine():
            Line((77.787779, 54.672003), (57.016447, 75.443335))
            ThreePointArc((57.016447, 75.443335), (48.412679, 54.672003), (57.016447, 33.90067))
            Line((57.016447, 33.90067), (77.787779, 54.672003))
        make_face()
    extrude(amount=-F3_DEPTH, mode=Mode.SUBTRACT)


solid = f1.part
